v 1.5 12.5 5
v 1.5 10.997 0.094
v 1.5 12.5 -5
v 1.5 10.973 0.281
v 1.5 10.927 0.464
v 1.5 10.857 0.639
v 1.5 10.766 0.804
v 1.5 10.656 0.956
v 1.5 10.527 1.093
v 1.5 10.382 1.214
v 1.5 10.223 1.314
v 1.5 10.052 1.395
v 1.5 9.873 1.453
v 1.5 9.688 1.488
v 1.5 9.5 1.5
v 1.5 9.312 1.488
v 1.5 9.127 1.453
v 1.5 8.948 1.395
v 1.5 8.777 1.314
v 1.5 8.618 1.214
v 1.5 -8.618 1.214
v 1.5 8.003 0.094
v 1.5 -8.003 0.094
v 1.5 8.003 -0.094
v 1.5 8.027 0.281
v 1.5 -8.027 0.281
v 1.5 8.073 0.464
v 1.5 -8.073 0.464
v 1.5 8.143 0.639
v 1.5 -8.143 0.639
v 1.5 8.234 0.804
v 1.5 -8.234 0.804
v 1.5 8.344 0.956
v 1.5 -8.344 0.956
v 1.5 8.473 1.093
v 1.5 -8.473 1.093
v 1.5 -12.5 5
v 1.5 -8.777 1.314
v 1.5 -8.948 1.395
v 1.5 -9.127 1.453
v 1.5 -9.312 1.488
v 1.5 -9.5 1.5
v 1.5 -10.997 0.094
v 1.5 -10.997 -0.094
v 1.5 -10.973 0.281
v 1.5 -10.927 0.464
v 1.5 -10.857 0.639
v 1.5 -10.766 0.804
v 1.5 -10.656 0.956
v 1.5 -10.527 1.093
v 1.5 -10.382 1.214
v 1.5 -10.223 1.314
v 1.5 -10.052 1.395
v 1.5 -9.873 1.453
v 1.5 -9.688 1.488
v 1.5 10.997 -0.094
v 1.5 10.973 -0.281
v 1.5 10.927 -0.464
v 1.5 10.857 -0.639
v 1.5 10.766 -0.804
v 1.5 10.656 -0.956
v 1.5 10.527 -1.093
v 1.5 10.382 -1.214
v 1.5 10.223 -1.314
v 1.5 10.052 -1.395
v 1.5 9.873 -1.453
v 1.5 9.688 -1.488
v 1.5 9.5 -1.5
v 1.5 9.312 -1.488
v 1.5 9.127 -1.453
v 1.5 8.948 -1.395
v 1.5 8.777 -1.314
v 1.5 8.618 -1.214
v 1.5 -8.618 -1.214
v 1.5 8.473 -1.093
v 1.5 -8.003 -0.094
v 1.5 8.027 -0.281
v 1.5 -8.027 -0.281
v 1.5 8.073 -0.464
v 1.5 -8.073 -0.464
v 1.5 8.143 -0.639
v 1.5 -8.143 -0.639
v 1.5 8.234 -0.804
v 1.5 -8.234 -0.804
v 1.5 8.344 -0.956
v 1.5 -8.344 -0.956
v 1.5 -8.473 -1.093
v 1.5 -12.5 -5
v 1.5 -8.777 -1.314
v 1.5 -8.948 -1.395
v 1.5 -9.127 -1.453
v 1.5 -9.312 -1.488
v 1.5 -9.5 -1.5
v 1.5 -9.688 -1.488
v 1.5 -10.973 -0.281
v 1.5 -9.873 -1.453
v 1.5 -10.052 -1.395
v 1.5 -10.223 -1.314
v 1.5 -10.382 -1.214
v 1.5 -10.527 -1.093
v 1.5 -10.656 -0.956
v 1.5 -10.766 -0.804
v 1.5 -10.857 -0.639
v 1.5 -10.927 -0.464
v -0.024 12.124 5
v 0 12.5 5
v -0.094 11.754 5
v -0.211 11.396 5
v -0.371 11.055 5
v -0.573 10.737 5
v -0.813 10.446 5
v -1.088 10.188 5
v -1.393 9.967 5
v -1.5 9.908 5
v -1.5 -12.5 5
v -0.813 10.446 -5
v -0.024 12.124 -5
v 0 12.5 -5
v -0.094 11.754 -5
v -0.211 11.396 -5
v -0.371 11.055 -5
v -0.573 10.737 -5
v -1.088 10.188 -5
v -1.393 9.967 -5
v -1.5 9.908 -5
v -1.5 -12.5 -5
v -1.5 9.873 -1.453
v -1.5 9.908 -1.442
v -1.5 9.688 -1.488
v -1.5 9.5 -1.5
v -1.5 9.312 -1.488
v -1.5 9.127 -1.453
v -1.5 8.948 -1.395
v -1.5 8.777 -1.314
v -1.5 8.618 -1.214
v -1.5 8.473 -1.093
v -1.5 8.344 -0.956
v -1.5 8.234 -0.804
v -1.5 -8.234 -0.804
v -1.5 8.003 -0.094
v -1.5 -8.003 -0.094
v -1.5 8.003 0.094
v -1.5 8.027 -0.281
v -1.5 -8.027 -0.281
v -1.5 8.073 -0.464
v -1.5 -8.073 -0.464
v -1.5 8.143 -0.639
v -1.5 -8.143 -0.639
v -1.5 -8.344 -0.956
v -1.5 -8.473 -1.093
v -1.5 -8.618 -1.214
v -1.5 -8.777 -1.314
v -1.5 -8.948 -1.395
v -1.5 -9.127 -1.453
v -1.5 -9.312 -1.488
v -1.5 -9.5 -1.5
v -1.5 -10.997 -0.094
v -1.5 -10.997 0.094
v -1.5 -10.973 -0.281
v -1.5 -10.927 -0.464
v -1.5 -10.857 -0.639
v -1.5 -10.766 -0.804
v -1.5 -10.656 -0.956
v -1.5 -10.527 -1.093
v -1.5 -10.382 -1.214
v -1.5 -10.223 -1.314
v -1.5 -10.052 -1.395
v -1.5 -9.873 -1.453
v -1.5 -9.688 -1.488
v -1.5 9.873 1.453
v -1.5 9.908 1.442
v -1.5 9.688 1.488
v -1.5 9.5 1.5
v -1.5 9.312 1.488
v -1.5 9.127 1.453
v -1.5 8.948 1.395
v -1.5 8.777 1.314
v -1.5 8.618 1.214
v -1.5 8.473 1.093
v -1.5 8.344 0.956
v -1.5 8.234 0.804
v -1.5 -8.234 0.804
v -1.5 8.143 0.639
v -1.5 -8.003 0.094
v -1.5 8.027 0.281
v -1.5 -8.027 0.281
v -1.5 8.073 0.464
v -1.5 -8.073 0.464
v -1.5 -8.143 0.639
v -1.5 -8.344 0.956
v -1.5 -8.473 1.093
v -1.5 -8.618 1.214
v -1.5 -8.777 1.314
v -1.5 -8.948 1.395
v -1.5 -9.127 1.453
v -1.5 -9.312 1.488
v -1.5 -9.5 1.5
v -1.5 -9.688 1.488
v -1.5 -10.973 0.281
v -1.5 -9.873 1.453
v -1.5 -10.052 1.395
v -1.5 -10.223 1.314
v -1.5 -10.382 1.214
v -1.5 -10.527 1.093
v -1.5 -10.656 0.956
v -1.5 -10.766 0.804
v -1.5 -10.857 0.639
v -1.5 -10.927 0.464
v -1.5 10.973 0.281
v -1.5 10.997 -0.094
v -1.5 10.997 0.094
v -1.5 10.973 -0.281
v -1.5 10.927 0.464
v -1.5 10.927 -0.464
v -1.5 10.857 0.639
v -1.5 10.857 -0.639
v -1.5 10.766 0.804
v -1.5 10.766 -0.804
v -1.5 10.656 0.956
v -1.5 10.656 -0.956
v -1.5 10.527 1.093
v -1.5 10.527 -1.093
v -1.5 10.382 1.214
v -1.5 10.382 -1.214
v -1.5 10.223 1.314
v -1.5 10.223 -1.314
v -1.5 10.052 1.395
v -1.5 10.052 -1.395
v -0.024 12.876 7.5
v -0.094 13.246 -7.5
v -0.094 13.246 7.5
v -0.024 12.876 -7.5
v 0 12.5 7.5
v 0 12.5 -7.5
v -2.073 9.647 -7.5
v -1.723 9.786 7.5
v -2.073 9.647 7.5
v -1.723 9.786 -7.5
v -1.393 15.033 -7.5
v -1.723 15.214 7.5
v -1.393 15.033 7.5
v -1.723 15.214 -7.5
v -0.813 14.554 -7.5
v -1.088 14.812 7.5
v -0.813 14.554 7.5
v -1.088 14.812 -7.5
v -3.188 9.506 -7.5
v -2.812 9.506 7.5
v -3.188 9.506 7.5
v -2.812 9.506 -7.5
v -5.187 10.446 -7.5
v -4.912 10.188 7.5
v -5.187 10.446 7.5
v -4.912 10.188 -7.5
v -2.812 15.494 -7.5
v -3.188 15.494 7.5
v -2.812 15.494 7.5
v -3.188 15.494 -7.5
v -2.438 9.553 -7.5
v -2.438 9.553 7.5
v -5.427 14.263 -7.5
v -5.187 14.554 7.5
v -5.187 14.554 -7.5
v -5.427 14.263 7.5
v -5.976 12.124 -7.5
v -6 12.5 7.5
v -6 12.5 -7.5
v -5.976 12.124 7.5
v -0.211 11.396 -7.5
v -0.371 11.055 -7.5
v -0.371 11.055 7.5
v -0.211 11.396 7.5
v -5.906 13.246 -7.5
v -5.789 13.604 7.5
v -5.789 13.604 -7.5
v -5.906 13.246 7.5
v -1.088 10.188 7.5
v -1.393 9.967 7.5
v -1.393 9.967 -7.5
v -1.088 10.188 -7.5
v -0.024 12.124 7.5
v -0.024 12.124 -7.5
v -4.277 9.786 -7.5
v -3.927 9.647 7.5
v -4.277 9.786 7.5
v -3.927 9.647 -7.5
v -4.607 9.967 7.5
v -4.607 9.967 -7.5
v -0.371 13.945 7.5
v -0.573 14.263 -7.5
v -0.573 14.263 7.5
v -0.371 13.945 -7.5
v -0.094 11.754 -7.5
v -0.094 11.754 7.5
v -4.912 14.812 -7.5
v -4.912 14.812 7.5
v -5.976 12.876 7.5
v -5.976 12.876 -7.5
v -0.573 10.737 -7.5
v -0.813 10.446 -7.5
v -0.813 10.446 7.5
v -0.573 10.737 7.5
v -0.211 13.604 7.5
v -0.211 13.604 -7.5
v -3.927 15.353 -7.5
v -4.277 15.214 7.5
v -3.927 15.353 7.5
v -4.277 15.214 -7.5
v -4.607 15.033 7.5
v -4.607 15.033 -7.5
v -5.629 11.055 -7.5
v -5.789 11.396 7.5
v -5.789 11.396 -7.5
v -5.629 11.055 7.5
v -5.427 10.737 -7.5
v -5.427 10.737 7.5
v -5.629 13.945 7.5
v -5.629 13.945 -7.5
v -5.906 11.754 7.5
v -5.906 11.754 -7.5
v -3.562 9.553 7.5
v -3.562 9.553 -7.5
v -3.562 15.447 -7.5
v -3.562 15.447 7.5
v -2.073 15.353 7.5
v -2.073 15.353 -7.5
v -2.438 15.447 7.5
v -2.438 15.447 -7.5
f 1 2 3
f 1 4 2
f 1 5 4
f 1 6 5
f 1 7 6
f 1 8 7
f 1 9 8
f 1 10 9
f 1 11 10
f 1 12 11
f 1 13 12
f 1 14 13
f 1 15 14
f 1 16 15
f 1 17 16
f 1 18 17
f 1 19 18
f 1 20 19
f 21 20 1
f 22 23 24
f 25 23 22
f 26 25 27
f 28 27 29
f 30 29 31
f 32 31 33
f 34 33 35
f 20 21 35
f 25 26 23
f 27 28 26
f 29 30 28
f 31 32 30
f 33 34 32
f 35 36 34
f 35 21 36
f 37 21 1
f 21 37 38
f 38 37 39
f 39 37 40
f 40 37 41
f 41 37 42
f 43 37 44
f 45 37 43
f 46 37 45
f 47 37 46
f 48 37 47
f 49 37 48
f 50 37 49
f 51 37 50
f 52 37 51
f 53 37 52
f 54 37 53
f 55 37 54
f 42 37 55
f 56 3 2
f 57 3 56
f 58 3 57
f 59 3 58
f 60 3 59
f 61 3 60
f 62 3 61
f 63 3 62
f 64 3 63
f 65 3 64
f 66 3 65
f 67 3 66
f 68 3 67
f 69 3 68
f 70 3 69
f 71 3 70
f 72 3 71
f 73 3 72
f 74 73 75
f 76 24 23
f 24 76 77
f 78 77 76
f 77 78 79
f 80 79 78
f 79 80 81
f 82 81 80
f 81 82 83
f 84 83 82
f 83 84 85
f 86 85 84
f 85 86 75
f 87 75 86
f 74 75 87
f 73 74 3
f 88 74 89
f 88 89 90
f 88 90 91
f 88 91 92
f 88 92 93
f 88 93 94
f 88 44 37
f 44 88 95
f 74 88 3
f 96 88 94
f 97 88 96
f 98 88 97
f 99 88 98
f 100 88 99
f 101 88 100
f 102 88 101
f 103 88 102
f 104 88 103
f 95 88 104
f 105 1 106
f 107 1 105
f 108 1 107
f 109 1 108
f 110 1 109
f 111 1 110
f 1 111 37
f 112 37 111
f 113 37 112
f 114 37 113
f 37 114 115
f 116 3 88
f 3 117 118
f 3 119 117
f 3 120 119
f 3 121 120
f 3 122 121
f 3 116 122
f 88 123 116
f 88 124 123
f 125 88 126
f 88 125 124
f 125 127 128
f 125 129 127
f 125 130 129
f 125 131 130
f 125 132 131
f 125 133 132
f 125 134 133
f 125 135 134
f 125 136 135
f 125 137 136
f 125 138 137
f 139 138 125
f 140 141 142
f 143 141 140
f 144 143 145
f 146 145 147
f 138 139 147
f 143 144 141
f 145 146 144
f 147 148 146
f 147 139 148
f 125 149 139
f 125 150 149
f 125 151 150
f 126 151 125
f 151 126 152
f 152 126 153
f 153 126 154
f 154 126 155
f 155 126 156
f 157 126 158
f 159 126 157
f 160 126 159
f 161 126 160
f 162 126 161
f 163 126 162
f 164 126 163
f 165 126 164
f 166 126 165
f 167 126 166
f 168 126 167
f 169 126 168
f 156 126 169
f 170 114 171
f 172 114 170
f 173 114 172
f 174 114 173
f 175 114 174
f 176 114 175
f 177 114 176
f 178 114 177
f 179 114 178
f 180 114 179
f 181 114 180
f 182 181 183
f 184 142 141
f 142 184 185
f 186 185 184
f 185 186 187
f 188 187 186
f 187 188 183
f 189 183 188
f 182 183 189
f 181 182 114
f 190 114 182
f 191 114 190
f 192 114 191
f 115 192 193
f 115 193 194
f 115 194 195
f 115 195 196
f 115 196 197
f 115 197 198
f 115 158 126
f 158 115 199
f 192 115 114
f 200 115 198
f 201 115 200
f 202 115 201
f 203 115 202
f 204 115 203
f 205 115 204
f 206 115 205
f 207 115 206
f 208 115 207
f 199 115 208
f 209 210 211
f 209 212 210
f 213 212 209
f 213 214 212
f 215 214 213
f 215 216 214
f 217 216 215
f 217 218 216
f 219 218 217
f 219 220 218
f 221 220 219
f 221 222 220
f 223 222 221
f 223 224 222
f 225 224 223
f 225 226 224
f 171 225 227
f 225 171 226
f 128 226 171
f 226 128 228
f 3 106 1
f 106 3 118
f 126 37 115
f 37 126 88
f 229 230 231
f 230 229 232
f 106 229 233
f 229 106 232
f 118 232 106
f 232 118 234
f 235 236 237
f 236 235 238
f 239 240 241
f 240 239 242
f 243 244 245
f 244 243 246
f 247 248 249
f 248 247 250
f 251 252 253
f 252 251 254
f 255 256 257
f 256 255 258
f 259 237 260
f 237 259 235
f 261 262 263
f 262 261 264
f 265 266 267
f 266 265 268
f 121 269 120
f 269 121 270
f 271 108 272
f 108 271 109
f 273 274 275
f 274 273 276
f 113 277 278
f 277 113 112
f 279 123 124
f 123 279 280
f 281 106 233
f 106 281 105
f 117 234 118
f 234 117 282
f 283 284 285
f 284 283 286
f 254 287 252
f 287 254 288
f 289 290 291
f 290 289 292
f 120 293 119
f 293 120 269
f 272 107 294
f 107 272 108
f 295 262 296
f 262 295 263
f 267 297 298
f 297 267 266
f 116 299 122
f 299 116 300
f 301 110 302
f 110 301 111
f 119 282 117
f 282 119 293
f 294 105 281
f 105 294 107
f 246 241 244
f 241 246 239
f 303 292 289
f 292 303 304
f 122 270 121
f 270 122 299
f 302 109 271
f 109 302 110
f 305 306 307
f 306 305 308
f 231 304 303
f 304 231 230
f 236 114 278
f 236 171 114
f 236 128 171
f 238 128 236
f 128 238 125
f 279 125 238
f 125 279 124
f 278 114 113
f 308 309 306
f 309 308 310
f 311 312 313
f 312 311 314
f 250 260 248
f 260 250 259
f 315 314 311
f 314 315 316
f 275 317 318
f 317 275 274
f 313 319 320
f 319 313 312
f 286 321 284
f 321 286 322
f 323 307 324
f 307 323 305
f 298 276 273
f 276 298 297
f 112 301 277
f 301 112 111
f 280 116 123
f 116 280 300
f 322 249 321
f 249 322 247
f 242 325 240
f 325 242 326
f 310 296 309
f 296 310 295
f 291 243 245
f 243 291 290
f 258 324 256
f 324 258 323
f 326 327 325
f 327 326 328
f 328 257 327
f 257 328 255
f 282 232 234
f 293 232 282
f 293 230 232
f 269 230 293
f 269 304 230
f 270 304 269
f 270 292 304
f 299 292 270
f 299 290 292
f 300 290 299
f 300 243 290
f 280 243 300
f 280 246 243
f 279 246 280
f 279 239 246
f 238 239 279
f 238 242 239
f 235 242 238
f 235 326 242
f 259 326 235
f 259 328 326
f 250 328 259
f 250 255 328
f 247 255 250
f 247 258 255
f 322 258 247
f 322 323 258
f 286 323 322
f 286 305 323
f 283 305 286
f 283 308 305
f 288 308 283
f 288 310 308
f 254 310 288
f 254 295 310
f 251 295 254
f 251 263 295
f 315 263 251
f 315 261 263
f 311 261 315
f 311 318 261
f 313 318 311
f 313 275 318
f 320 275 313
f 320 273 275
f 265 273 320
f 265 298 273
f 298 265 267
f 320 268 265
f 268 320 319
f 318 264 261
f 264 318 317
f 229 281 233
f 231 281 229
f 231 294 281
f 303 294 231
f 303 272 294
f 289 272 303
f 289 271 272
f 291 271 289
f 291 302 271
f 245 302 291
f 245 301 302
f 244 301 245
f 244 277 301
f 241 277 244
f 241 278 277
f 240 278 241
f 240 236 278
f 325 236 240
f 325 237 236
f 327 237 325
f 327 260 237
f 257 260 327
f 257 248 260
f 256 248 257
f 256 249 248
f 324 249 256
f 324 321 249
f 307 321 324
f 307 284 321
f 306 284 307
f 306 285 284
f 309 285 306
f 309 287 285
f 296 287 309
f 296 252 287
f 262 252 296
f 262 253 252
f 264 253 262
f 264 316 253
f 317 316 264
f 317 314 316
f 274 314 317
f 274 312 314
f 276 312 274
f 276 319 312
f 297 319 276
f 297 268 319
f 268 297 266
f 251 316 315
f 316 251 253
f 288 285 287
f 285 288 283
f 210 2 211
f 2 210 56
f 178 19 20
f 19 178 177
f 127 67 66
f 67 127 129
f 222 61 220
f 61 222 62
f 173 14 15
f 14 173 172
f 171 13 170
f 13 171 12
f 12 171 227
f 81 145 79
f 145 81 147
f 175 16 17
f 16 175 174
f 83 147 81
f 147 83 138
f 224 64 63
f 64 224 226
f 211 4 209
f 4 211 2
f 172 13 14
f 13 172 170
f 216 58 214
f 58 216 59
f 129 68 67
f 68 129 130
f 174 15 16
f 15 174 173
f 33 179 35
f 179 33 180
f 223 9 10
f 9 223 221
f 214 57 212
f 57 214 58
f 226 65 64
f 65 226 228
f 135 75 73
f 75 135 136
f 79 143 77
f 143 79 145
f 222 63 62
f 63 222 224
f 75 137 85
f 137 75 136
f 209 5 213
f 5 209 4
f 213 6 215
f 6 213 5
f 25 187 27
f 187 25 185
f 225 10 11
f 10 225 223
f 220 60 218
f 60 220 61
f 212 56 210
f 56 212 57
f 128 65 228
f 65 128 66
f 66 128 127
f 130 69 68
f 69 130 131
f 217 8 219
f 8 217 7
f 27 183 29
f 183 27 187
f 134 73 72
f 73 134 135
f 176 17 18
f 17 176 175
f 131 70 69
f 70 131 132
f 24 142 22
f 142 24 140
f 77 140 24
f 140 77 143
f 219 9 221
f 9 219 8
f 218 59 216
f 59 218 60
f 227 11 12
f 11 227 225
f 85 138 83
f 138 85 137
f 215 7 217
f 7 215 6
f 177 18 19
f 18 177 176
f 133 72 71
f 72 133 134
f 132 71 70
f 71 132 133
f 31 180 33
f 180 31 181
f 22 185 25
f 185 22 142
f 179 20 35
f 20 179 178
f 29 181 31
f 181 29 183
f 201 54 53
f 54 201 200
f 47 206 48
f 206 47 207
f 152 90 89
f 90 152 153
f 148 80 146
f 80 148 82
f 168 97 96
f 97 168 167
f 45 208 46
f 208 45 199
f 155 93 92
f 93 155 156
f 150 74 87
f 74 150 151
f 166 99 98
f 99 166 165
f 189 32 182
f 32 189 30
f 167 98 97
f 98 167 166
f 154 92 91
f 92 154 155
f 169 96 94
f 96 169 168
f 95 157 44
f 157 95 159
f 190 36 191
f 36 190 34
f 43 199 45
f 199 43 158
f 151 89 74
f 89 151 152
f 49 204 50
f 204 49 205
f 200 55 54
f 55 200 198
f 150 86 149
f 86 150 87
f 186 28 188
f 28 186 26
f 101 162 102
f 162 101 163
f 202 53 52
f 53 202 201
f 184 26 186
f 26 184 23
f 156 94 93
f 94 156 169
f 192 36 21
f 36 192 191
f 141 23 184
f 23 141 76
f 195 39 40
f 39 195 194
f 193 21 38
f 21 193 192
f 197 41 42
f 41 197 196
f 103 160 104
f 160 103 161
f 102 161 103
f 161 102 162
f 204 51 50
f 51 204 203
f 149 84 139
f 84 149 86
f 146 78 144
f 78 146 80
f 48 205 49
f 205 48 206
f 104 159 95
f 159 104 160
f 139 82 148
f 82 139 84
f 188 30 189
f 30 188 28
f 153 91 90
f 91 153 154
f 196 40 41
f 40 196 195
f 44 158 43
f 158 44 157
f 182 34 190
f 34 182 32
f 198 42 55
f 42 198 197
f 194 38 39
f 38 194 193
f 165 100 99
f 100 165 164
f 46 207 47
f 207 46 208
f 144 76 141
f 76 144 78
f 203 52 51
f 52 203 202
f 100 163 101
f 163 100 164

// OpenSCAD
//z axis mount

$fn=50;
holeSpacing=19;
height=10;
wallThickness=3;
screwDiameter=3;

cylinderHeight=15;
//mounting plate
difference()
	{
		union()
		{
			//plate
			cube([wallThickness,holeSpacing+2*wallThickness,height],true);
		
			//cylinders to allow adjustment
			translate([-(wallThickness/2+wallThickness/2),holeSpacing/2+screwDiameter,0])
			cylinder(cylinderHeight,wallThickness,wallThickness,true);
		}
	//screw holes
	translate([0,holeSpacing/2,0])
	rotate([0,90,0])
	cylinder(wallThickness,screwDiameter/2,screwDiameter/2,true);

	//screw holes
	translate([0,-holeSpacing/2,0])
	rotate([0,90,0])
	cylinder(wallThickness,screwDiameter/2,screwDiameter/2,true);



}
